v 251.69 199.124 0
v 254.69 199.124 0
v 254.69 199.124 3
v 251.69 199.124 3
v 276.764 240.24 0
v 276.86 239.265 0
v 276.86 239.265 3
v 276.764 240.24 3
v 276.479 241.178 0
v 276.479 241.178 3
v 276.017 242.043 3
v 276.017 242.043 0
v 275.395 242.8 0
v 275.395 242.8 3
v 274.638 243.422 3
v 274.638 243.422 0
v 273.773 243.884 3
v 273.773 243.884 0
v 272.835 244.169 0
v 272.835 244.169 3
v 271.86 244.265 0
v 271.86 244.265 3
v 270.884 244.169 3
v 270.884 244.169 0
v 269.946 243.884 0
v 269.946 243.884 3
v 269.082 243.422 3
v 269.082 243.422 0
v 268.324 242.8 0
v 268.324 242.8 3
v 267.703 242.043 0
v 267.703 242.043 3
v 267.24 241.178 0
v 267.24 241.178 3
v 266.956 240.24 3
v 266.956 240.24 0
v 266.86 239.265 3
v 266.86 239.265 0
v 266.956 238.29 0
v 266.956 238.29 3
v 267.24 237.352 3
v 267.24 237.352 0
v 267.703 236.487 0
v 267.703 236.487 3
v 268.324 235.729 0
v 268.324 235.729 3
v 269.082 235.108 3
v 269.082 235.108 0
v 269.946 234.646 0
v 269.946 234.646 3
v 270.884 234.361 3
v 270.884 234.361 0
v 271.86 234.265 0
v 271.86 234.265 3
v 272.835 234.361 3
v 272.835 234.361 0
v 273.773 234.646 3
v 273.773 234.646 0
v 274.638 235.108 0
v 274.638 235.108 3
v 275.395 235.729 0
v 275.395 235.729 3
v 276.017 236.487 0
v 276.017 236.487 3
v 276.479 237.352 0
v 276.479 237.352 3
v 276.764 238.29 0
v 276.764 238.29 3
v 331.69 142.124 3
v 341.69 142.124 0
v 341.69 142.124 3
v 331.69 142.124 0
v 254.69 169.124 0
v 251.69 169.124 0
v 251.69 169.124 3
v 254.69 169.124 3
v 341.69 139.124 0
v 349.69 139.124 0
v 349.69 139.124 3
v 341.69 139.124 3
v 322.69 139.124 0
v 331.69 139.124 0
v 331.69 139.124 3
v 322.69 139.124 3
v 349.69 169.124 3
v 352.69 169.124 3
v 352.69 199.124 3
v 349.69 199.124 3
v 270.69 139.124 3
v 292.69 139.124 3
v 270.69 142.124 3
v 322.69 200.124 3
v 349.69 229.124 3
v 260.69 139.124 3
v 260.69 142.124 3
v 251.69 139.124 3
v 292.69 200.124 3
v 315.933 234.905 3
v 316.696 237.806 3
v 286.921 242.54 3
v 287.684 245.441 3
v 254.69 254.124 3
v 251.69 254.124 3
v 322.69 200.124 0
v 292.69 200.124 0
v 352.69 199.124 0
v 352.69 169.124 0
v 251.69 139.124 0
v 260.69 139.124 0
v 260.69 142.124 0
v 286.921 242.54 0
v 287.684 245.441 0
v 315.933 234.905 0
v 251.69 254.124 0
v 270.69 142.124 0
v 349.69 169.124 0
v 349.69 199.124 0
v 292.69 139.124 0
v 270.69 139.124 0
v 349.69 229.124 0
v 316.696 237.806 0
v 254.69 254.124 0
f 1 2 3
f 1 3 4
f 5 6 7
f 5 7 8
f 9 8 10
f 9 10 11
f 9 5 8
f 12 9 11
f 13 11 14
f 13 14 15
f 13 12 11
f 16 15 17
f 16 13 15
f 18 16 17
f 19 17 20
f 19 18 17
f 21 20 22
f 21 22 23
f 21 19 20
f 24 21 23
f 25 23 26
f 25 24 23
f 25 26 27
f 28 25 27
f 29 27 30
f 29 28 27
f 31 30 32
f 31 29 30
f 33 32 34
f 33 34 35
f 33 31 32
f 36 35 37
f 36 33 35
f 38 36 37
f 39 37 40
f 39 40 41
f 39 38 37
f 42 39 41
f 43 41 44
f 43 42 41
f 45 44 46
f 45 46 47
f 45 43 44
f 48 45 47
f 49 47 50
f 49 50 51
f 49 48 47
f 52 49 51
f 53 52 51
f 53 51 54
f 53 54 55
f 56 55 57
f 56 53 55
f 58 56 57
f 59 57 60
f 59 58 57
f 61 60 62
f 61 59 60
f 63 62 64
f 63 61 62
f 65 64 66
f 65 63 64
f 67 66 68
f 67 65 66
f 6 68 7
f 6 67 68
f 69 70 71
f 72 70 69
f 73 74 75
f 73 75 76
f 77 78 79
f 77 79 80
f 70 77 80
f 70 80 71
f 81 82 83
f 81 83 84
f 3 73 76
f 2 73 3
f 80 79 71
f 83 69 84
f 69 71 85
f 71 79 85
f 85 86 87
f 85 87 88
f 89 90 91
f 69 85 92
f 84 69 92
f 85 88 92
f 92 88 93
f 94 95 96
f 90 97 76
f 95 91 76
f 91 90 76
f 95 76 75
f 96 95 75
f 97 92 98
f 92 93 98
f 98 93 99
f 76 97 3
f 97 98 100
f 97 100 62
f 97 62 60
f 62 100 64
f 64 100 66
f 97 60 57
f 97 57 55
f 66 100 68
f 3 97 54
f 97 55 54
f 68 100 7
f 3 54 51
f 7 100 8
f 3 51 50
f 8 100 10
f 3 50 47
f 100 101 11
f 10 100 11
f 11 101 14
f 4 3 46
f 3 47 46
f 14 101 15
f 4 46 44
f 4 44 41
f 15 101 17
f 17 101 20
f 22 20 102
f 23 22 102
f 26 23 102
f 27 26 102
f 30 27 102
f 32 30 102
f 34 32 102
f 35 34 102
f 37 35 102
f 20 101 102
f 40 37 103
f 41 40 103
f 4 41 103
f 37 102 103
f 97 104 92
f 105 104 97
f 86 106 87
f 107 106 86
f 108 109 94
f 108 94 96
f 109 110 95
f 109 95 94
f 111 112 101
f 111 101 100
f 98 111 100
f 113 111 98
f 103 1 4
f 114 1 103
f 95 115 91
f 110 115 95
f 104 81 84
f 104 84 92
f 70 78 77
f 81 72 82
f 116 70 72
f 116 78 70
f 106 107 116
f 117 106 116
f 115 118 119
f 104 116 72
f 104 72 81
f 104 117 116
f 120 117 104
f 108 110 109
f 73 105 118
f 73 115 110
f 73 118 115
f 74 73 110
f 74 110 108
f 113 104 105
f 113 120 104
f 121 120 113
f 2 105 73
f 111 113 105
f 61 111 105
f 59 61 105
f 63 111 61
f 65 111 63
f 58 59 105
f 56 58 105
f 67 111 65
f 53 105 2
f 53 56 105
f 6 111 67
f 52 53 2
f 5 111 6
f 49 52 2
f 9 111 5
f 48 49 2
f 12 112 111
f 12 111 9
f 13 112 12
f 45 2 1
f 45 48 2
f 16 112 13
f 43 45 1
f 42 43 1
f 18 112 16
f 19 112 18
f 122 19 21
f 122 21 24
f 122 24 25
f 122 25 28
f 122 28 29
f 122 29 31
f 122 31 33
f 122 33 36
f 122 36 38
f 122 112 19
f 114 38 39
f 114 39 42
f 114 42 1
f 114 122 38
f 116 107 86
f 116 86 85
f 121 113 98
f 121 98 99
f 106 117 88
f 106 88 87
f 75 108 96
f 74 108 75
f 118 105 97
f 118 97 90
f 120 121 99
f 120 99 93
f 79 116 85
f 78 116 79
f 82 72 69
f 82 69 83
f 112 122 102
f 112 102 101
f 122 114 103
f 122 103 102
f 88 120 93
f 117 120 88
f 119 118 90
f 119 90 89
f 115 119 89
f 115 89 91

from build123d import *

# Parameters (mm, degrees)
MODEL_R             = 5
BOSS_EXTRUDE1_DEPTH = 3


with BuildPart() as part:
    # Model → Boss-Extrude1 (new body)
    with BuildSketch(Plane.XY):
        Polygon((352.69017886, 199.123752973), (352.69017886, 169.123752973), (349.69017886, 169.123752973), (349.69017886, 139.123752973), (341.69017886, 139.123752973), (341.69017886, 142.123752973), (331.69017886, 142.123752973), (331.69017886, 139.123752973), (322.69017886, 139.123752973), (322.69017886, 200.123752973), (292.69017886, 200.123752973), (292.69017886, 139.123752973), (270.69017886, 139.123752973), (270.69017886, 142.123752973), (260.69017886, 142.123752973), (260.69017886, 139.123752973), (251.69017886, 139.123752973), (251.69017886, 169.123752973), (254.69017886, 169.123752973), (254.69017886, 199.123752973), (251.69017886, 199.123752973), (251.69017886, 254.123752973), (254.69017886, 254.123752973), (287.684060801, 245.441152462), (286.920580903, 242.539928851), (315.932817021, 234.905129872), (316.696296919, 237.806353484), (349.69017886, 229.123752973), (349.69017886, 199.123752973), align=None)
        with Locations((271.859853833, 239.264952873)):
            Circle(MODEL_R, mode=Mode.SUBTRACT)
    extrude(amount=BOSS_EXTRUDE1_DEPTH)


solid = part.part
